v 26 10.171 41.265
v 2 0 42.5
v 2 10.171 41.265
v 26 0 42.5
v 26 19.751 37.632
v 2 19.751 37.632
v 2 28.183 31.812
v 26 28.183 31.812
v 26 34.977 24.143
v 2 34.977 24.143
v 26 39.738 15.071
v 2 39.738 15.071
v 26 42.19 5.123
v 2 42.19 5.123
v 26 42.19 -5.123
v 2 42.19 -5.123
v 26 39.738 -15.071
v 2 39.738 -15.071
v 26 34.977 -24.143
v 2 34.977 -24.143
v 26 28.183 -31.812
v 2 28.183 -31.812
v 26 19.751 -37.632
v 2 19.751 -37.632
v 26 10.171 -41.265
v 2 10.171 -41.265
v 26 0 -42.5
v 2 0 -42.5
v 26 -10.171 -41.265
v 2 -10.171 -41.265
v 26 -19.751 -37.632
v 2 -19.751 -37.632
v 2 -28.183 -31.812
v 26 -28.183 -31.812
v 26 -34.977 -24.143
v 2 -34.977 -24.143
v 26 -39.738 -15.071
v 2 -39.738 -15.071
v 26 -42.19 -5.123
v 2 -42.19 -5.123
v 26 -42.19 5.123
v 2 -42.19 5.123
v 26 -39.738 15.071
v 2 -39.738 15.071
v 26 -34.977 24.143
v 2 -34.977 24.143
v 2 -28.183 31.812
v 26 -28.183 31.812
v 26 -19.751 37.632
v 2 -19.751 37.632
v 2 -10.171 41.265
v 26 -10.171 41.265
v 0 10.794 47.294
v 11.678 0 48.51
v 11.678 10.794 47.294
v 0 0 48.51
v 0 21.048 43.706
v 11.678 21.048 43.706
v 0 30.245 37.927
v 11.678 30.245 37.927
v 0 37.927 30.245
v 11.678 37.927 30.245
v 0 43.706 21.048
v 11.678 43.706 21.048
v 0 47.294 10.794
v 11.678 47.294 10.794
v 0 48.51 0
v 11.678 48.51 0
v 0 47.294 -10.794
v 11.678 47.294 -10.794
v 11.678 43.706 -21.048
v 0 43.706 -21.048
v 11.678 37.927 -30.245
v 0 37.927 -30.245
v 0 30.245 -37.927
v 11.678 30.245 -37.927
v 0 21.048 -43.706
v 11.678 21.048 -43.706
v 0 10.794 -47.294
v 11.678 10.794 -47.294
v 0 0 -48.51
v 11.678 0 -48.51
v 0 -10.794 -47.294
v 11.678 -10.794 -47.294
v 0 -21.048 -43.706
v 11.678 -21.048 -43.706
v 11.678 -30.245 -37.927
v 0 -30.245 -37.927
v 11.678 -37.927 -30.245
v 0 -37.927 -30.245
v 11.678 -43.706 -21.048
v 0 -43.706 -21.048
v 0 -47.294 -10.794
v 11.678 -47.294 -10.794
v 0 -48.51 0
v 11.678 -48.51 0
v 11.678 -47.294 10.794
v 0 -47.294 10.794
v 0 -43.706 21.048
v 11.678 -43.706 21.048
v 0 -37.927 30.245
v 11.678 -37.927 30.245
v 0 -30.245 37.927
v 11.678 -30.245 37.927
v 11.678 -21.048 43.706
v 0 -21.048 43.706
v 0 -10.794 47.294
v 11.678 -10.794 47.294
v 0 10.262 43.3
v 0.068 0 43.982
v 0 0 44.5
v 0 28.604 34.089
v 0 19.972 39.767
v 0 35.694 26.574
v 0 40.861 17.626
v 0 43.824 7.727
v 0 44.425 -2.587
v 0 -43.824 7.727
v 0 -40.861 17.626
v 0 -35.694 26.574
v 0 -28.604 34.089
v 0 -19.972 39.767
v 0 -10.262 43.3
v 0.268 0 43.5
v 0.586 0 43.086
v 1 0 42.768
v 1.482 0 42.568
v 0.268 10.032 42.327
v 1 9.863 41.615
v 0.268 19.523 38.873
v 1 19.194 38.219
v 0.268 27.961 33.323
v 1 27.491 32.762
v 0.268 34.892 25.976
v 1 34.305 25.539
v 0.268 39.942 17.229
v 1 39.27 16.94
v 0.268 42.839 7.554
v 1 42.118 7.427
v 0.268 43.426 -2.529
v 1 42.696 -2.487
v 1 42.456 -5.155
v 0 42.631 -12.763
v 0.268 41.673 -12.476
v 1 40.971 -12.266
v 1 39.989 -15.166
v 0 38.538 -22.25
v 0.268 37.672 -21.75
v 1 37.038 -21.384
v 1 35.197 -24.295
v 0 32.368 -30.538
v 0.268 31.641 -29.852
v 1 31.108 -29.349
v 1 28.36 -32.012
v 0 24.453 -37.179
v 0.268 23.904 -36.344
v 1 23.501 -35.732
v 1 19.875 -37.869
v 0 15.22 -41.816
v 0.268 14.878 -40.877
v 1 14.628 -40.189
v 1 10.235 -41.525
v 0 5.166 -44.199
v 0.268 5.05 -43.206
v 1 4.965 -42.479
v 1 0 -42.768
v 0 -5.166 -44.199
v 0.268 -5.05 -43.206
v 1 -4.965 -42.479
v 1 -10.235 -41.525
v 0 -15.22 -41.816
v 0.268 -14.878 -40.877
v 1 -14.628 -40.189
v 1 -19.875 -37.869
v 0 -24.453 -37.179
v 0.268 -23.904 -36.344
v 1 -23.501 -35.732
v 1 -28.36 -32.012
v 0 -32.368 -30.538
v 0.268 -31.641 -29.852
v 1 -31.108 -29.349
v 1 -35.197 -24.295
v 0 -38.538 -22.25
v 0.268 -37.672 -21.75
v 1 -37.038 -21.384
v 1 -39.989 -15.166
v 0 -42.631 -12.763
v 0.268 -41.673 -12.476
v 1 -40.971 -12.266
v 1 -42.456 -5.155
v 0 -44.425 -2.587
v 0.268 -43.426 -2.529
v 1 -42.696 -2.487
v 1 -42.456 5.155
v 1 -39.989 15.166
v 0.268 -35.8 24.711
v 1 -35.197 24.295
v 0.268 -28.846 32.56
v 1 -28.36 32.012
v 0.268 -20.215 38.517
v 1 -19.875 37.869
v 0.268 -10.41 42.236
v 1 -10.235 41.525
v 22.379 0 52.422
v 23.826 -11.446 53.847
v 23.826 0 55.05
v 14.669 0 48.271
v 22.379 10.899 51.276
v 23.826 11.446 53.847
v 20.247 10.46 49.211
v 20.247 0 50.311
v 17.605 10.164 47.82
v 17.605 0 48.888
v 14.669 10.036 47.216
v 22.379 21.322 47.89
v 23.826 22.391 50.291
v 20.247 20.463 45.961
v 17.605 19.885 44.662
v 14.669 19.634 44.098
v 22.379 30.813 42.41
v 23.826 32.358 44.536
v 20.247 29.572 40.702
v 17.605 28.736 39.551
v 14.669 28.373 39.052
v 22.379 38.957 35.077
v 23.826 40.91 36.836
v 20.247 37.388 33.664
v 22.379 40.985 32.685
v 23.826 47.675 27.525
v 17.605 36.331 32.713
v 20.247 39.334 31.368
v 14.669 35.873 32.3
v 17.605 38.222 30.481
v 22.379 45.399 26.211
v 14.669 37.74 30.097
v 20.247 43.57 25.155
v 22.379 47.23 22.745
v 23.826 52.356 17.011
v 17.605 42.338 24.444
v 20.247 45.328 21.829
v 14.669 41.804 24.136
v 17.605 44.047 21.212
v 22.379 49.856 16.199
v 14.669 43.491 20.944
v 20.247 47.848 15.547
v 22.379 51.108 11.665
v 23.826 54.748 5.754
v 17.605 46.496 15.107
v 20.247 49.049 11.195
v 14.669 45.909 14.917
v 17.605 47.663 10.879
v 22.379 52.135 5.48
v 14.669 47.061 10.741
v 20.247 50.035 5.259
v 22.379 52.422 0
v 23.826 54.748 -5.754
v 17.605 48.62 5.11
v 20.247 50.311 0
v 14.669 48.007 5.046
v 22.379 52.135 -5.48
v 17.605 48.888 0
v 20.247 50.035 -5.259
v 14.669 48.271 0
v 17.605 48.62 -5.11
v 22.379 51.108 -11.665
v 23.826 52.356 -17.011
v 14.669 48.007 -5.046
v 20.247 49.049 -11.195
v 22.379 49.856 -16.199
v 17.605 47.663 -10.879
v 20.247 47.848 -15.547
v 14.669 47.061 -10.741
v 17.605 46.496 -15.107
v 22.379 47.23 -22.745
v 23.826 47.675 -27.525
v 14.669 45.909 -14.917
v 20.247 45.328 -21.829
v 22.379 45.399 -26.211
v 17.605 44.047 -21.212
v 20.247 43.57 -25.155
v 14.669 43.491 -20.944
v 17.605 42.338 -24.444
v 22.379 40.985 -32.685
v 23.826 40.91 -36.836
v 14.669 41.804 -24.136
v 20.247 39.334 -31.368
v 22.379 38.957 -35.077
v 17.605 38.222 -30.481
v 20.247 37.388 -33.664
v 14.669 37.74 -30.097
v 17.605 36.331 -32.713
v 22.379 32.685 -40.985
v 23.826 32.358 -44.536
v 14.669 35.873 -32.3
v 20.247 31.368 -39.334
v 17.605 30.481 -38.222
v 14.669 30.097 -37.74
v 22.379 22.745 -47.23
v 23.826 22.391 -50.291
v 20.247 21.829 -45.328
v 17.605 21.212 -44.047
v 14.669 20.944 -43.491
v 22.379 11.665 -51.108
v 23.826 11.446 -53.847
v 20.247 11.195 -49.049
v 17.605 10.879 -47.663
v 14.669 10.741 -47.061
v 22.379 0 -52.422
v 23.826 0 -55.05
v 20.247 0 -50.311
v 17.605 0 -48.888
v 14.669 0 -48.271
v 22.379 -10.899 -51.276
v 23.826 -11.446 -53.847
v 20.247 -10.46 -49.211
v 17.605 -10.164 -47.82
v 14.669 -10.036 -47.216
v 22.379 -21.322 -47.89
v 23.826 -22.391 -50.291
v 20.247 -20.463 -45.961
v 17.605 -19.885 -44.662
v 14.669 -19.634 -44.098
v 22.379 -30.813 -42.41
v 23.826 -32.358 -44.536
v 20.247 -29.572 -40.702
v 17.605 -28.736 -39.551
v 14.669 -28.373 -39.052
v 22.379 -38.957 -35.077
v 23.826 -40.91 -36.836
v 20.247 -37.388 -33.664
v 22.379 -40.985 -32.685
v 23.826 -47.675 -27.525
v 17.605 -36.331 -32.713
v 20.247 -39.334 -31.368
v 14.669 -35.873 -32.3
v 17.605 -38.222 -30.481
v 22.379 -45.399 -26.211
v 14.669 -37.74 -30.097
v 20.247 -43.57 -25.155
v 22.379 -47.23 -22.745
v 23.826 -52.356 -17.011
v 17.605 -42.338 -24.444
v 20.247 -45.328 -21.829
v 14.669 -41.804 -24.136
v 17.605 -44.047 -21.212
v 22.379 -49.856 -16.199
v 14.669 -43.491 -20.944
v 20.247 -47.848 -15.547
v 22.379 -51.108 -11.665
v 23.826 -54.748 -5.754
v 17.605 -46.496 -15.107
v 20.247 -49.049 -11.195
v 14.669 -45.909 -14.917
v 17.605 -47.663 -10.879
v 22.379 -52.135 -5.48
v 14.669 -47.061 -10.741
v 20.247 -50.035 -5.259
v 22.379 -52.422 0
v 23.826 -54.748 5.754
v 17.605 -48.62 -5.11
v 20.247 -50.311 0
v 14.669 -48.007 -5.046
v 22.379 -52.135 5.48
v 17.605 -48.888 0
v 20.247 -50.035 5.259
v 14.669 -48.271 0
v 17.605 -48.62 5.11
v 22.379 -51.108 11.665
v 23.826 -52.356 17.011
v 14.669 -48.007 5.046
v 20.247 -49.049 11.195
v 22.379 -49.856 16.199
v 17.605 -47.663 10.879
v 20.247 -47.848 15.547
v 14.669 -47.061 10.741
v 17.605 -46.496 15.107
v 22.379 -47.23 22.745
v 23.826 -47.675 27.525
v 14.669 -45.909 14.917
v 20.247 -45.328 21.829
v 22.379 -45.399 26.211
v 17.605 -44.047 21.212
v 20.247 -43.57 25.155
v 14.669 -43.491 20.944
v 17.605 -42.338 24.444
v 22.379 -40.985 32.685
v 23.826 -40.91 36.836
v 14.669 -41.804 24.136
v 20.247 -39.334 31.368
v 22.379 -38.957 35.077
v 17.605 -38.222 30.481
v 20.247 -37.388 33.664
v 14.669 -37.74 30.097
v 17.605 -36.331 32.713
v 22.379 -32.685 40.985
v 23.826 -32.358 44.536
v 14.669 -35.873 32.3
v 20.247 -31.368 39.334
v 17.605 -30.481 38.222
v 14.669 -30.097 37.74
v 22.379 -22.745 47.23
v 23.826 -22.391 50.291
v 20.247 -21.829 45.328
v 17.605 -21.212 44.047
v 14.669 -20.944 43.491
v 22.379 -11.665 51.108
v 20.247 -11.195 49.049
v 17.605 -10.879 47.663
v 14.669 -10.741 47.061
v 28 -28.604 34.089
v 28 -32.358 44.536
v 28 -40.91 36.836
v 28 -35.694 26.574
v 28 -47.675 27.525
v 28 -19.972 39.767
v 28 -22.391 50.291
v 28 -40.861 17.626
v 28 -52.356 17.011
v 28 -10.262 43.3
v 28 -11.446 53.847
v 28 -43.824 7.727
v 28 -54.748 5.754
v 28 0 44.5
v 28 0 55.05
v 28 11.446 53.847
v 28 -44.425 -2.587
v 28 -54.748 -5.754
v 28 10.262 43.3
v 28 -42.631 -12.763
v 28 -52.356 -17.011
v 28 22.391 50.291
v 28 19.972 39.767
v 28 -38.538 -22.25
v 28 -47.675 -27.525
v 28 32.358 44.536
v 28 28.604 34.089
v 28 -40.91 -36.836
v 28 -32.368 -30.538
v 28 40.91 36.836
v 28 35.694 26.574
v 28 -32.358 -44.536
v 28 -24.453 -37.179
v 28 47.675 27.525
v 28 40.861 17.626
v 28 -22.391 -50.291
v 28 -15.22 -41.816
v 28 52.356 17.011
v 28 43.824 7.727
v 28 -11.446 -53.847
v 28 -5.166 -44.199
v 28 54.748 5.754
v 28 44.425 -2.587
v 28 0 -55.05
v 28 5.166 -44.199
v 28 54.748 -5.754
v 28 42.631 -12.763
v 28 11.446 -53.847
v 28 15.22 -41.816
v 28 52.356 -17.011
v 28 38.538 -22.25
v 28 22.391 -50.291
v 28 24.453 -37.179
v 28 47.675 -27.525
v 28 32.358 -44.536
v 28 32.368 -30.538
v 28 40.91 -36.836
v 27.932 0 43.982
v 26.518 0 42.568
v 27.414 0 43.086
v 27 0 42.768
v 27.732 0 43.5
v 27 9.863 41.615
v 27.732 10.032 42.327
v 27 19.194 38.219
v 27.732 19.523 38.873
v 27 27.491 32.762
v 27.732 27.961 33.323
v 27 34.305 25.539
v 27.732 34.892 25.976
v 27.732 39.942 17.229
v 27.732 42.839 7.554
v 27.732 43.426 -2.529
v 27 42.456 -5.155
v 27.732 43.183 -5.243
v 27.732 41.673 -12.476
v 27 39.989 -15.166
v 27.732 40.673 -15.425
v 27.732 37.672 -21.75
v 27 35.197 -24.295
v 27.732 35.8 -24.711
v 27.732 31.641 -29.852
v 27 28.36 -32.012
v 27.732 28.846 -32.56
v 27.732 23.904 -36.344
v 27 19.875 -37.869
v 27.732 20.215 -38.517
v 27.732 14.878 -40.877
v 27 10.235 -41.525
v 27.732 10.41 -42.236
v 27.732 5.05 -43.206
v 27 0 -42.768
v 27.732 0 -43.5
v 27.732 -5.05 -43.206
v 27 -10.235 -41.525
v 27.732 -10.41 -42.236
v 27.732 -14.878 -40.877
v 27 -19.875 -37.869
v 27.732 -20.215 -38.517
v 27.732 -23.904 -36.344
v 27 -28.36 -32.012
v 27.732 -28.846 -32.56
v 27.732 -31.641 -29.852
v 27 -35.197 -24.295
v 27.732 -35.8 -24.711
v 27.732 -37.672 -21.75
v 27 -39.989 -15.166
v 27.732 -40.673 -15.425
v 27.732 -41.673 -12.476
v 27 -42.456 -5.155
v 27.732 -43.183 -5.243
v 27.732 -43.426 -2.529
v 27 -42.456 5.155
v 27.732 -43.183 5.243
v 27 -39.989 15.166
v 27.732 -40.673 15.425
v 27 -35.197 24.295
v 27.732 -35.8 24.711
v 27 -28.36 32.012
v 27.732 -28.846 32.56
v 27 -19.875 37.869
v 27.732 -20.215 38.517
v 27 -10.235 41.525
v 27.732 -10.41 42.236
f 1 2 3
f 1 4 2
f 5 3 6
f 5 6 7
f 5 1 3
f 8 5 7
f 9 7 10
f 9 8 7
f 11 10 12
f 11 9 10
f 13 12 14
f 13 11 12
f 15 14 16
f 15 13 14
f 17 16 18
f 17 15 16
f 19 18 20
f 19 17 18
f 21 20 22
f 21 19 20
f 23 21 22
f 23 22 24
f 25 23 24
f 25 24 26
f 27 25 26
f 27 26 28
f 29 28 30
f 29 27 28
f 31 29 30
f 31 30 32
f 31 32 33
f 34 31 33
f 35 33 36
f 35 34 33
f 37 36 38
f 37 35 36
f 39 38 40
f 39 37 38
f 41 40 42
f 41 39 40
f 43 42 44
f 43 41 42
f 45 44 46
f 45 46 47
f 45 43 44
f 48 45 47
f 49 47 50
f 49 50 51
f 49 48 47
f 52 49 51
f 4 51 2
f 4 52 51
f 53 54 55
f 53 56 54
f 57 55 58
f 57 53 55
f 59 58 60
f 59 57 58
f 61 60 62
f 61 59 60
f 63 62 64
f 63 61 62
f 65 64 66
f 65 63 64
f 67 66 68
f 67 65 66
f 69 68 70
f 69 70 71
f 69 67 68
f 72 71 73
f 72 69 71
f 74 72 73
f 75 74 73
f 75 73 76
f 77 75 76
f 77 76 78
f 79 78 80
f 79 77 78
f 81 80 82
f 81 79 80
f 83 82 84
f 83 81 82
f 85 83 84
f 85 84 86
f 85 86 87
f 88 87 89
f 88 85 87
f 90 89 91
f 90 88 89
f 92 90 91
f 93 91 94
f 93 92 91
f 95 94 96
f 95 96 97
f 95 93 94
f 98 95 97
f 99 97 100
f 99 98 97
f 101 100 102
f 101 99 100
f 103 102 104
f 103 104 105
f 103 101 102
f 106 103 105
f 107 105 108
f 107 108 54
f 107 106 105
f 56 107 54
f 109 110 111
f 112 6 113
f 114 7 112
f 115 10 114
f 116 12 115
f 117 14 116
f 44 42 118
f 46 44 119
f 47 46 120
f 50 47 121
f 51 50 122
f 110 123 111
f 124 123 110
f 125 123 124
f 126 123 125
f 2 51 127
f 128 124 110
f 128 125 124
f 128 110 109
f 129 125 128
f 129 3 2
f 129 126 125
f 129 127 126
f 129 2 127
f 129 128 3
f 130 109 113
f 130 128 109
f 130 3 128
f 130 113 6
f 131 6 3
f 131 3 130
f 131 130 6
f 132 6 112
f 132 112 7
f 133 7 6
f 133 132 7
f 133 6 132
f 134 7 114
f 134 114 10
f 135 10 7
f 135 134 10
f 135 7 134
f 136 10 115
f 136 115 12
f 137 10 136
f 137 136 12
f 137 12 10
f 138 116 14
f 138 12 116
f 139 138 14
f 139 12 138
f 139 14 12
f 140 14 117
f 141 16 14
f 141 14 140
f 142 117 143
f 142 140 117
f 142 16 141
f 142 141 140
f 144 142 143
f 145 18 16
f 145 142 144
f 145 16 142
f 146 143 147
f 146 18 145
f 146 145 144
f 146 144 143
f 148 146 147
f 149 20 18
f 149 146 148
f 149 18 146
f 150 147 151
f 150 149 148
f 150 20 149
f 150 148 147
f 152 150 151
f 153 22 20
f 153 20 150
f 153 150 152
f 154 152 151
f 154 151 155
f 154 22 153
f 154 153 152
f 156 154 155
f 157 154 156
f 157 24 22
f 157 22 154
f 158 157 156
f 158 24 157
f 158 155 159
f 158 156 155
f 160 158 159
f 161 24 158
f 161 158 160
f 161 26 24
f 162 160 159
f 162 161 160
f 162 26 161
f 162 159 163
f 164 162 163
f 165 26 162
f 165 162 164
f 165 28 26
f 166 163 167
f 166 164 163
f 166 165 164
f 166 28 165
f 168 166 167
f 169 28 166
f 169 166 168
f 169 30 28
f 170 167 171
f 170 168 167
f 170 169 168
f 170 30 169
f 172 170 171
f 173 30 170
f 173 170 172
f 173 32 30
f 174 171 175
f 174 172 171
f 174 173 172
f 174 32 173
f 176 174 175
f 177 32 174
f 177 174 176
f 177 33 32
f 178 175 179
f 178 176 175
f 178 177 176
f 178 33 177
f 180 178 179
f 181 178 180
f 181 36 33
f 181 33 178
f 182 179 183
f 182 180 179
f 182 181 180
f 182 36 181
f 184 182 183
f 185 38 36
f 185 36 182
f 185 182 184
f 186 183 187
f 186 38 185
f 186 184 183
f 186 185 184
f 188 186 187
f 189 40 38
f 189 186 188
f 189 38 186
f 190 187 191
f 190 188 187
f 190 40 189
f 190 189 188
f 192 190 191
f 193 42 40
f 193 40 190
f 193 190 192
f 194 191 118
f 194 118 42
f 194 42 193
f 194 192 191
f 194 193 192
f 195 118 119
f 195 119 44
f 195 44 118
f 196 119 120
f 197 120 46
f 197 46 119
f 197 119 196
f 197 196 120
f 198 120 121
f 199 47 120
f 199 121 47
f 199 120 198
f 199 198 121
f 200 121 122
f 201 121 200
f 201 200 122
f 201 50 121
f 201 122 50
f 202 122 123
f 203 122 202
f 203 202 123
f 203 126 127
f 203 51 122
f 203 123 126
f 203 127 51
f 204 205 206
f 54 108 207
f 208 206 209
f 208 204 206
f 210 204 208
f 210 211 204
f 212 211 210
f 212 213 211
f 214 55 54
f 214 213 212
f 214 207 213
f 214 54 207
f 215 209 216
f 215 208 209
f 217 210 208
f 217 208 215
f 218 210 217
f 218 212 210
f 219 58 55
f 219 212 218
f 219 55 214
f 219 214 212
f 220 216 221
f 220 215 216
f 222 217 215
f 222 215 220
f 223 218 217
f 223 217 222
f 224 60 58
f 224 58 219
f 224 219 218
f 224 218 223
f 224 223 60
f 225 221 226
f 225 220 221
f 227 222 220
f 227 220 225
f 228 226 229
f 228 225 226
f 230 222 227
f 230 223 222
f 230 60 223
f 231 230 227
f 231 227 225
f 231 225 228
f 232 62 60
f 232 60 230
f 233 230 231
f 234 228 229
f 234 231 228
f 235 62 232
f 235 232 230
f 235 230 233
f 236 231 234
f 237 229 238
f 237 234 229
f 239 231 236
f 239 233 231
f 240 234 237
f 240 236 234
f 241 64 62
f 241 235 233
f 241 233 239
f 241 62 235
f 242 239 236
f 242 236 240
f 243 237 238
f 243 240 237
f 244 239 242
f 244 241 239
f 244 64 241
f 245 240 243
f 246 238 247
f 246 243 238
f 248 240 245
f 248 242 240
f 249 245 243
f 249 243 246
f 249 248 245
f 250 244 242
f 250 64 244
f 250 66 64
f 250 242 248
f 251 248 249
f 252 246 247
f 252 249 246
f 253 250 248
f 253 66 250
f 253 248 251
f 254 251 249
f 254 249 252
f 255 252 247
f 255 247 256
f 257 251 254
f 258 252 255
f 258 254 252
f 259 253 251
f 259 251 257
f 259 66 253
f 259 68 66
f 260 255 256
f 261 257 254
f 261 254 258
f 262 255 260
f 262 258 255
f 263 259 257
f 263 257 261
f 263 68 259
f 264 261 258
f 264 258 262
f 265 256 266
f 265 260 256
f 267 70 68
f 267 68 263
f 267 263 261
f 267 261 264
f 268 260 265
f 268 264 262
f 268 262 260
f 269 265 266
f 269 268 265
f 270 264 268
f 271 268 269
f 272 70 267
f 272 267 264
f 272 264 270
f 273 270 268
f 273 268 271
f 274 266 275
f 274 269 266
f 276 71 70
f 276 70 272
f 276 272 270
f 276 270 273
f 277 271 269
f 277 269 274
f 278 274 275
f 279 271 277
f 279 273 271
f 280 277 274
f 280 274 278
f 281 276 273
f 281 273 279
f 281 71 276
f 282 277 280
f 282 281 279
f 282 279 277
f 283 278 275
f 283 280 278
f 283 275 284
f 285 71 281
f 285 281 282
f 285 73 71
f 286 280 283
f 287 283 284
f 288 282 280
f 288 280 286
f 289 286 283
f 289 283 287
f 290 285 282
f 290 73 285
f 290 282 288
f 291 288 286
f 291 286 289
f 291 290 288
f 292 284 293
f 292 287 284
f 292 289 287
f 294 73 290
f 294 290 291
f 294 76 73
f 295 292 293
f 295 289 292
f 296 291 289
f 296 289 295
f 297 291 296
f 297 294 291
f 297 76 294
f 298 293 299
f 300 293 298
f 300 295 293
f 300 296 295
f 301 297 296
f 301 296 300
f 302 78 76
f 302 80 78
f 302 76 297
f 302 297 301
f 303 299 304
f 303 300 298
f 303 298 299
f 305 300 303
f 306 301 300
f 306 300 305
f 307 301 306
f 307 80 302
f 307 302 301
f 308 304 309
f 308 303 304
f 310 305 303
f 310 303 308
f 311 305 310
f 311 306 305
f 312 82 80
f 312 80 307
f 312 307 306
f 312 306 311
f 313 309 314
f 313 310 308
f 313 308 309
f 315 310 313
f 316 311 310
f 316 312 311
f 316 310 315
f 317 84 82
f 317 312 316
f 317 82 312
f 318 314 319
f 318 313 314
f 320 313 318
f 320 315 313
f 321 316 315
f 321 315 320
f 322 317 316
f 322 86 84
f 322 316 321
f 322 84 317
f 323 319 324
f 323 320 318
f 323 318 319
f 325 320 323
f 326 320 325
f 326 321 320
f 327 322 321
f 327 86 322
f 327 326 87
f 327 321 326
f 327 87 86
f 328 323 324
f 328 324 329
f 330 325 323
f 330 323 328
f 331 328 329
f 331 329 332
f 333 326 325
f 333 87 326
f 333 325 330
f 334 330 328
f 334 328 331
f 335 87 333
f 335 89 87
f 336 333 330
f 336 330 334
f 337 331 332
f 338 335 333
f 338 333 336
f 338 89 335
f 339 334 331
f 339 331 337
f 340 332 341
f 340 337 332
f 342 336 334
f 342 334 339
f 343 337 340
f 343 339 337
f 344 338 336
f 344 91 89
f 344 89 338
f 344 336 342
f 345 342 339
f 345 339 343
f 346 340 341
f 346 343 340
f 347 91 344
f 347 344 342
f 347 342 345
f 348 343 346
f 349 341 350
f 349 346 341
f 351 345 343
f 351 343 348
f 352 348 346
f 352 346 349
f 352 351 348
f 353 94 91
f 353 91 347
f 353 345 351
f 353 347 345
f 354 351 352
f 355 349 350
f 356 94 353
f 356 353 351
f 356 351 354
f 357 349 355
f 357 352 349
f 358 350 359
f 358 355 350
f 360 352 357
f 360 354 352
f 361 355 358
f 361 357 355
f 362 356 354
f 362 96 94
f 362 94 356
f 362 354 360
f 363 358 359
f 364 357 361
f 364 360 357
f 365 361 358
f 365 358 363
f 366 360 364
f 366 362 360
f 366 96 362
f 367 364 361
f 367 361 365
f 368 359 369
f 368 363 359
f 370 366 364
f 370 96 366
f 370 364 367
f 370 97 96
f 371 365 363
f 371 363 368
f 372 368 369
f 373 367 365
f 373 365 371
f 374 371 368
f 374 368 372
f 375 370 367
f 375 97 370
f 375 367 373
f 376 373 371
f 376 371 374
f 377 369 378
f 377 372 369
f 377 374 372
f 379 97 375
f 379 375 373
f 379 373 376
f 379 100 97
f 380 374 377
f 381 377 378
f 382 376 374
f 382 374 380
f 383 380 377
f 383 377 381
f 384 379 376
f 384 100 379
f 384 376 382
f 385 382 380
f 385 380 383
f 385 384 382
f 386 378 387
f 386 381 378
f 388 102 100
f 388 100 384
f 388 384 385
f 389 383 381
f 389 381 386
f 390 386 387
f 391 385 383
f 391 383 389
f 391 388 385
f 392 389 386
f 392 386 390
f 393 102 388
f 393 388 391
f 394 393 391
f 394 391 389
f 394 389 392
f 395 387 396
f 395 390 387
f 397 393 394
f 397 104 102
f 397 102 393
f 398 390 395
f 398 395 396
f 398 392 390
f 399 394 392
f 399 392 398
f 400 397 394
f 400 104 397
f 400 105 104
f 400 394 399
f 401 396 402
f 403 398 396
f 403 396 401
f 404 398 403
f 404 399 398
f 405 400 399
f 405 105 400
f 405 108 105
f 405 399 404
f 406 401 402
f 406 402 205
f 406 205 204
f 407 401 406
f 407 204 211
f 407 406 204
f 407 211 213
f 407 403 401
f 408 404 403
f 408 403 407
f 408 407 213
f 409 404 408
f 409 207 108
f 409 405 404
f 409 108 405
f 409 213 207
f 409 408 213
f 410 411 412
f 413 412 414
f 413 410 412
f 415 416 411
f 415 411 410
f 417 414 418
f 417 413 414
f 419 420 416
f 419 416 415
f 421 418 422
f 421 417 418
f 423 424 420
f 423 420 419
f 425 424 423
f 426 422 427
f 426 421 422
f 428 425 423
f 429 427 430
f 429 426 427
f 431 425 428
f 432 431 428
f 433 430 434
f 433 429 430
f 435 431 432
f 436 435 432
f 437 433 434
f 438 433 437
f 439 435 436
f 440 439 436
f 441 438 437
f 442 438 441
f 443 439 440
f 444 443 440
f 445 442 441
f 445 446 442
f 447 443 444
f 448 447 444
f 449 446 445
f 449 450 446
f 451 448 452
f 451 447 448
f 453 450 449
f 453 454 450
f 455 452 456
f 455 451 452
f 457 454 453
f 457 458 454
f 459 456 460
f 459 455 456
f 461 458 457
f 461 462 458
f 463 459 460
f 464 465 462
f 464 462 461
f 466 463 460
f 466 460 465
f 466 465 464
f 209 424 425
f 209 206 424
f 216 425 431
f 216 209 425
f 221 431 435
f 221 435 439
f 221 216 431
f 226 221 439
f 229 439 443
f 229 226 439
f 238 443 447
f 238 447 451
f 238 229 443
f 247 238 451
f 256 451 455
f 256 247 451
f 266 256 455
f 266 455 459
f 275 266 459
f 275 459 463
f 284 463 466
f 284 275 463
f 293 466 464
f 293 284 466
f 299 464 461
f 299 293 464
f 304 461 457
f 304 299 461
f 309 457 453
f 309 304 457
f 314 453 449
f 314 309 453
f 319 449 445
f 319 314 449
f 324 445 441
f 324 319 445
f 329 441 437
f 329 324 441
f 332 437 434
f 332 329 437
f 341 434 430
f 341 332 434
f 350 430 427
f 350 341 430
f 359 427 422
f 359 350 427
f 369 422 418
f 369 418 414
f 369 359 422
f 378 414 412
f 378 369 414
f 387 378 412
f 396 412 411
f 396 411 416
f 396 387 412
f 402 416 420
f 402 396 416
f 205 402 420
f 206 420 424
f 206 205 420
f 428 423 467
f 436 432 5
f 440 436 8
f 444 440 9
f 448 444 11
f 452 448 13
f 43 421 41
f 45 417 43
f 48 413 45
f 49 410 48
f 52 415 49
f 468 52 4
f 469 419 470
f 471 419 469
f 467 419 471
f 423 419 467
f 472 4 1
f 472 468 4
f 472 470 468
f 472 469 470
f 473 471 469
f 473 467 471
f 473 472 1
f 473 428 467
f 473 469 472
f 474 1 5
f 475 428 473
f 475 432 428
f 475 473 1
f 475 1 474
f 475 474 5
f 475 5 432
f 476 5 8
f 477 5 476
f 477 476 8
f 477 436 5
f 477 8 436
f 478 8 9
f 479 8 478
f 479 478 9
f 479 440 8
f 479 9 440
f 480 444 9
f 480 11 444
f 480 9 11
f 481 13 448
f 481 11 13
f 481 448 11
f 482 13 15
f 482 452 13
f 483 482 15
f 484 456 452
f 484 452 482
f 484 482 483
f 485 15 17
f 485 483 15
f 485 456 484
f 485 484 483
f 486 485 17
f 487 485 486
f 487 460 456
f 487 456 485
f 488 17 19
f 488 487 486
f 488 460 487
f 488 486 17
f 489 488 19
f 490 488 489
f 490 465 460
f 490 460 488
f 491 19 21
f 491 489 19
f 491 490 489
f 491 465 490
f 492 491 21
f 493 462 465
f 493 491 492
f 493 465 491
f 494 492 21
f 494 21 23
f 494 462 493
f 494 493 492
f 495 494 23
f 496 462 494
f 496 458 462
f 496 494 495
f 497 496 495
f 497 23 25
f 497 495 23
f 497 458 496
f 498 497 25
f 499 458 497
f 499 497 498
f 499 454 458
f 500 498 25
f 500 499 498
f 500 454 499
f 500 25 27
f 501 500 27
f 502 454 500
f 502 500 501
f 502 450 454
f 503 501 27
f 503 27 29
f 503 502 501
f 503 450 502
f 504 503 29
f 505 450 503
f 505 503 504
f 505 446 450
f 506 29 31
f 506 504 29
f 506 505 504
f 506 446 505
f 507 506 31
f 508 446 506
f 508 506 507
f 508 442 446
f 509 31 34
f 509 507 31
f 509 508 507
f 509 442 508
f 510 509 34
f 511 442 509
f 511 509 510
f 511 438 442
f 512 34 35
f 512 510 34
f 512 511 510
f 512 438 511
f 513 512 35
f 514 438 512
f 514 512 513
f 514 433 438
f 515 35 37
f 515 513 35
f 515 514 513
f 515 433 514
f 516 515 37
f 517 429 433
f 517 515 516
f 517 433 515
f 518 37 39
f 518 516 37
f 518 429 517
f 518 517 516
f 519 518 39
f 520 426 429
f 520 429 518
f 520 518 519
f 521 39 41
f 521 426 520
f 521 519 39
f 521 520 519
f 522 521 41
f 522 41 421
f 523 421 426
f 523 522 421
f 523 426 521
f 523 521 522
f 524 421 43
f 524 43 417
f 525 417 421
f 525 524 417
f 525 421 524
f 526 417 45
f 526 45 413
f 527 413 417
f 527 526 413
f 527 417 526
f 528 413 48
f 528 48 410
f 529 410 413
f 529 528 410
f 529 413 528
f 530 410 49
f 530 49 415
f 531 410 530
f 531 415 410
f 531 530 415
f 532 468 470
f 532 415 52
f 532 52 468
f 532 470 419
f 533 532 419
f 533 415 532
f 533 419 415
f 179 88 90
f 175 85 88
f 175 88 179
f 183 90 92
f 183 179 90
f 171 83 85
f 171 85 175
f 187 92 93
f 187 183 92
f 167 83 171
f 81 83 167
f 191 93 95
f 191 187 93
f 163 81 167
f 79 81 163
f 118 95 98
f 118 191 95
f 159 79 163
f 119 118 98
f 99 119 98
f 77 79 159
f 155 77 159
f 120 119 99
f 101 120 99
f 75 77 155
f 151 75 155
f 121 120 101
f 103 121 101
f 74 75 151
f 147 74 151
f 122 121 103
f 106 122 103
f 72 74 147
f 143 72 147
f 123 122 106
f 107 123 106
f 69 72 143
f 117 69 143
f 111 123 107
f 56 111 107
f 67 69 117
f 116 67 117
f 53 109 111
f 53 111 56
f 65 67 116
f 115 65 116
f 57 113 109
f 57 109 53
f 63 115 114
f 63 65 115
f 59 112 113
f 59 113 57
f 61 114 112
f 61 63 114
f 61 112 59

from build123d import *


with BuildPart() as part:
    # Schizzo1 → Rivoluzione1 (revolve)
    with BuildSketch(Plane.XY, mode=Mode.PRIVATE) as rivoluzione1_sk:
        with BuildLine():
            Line((0, 48.51), (0, 44.5))
            ThreePointArc((0, 44.5), (0.585786438, 43.085786438), (2, 42.5))
            Line((2, 42.5), (26, 42.5))
            ThreePointArc((26, 42.5), (27.414213562, 43.085786438), (28, 44.5))
            Line((28, 44.5), (28, 55.05))
            Line((28, 55.05), (23.826494797, 55.05))
            ThreePointArc((23.826494797, 55.05), (18.977115837, 49.504551501), (11.677845828, 48.51))
            Line((11.677845828, 48.51), (0, 48.51))
        make_face()
    revolve(rivoluzione1_sk.sketch.rotate(Axis((28, 0, 0), (-1, 0, 0)), 270), axis=Axis((28, 0, 0), (-1, 0, 0)))


solid = part.part
